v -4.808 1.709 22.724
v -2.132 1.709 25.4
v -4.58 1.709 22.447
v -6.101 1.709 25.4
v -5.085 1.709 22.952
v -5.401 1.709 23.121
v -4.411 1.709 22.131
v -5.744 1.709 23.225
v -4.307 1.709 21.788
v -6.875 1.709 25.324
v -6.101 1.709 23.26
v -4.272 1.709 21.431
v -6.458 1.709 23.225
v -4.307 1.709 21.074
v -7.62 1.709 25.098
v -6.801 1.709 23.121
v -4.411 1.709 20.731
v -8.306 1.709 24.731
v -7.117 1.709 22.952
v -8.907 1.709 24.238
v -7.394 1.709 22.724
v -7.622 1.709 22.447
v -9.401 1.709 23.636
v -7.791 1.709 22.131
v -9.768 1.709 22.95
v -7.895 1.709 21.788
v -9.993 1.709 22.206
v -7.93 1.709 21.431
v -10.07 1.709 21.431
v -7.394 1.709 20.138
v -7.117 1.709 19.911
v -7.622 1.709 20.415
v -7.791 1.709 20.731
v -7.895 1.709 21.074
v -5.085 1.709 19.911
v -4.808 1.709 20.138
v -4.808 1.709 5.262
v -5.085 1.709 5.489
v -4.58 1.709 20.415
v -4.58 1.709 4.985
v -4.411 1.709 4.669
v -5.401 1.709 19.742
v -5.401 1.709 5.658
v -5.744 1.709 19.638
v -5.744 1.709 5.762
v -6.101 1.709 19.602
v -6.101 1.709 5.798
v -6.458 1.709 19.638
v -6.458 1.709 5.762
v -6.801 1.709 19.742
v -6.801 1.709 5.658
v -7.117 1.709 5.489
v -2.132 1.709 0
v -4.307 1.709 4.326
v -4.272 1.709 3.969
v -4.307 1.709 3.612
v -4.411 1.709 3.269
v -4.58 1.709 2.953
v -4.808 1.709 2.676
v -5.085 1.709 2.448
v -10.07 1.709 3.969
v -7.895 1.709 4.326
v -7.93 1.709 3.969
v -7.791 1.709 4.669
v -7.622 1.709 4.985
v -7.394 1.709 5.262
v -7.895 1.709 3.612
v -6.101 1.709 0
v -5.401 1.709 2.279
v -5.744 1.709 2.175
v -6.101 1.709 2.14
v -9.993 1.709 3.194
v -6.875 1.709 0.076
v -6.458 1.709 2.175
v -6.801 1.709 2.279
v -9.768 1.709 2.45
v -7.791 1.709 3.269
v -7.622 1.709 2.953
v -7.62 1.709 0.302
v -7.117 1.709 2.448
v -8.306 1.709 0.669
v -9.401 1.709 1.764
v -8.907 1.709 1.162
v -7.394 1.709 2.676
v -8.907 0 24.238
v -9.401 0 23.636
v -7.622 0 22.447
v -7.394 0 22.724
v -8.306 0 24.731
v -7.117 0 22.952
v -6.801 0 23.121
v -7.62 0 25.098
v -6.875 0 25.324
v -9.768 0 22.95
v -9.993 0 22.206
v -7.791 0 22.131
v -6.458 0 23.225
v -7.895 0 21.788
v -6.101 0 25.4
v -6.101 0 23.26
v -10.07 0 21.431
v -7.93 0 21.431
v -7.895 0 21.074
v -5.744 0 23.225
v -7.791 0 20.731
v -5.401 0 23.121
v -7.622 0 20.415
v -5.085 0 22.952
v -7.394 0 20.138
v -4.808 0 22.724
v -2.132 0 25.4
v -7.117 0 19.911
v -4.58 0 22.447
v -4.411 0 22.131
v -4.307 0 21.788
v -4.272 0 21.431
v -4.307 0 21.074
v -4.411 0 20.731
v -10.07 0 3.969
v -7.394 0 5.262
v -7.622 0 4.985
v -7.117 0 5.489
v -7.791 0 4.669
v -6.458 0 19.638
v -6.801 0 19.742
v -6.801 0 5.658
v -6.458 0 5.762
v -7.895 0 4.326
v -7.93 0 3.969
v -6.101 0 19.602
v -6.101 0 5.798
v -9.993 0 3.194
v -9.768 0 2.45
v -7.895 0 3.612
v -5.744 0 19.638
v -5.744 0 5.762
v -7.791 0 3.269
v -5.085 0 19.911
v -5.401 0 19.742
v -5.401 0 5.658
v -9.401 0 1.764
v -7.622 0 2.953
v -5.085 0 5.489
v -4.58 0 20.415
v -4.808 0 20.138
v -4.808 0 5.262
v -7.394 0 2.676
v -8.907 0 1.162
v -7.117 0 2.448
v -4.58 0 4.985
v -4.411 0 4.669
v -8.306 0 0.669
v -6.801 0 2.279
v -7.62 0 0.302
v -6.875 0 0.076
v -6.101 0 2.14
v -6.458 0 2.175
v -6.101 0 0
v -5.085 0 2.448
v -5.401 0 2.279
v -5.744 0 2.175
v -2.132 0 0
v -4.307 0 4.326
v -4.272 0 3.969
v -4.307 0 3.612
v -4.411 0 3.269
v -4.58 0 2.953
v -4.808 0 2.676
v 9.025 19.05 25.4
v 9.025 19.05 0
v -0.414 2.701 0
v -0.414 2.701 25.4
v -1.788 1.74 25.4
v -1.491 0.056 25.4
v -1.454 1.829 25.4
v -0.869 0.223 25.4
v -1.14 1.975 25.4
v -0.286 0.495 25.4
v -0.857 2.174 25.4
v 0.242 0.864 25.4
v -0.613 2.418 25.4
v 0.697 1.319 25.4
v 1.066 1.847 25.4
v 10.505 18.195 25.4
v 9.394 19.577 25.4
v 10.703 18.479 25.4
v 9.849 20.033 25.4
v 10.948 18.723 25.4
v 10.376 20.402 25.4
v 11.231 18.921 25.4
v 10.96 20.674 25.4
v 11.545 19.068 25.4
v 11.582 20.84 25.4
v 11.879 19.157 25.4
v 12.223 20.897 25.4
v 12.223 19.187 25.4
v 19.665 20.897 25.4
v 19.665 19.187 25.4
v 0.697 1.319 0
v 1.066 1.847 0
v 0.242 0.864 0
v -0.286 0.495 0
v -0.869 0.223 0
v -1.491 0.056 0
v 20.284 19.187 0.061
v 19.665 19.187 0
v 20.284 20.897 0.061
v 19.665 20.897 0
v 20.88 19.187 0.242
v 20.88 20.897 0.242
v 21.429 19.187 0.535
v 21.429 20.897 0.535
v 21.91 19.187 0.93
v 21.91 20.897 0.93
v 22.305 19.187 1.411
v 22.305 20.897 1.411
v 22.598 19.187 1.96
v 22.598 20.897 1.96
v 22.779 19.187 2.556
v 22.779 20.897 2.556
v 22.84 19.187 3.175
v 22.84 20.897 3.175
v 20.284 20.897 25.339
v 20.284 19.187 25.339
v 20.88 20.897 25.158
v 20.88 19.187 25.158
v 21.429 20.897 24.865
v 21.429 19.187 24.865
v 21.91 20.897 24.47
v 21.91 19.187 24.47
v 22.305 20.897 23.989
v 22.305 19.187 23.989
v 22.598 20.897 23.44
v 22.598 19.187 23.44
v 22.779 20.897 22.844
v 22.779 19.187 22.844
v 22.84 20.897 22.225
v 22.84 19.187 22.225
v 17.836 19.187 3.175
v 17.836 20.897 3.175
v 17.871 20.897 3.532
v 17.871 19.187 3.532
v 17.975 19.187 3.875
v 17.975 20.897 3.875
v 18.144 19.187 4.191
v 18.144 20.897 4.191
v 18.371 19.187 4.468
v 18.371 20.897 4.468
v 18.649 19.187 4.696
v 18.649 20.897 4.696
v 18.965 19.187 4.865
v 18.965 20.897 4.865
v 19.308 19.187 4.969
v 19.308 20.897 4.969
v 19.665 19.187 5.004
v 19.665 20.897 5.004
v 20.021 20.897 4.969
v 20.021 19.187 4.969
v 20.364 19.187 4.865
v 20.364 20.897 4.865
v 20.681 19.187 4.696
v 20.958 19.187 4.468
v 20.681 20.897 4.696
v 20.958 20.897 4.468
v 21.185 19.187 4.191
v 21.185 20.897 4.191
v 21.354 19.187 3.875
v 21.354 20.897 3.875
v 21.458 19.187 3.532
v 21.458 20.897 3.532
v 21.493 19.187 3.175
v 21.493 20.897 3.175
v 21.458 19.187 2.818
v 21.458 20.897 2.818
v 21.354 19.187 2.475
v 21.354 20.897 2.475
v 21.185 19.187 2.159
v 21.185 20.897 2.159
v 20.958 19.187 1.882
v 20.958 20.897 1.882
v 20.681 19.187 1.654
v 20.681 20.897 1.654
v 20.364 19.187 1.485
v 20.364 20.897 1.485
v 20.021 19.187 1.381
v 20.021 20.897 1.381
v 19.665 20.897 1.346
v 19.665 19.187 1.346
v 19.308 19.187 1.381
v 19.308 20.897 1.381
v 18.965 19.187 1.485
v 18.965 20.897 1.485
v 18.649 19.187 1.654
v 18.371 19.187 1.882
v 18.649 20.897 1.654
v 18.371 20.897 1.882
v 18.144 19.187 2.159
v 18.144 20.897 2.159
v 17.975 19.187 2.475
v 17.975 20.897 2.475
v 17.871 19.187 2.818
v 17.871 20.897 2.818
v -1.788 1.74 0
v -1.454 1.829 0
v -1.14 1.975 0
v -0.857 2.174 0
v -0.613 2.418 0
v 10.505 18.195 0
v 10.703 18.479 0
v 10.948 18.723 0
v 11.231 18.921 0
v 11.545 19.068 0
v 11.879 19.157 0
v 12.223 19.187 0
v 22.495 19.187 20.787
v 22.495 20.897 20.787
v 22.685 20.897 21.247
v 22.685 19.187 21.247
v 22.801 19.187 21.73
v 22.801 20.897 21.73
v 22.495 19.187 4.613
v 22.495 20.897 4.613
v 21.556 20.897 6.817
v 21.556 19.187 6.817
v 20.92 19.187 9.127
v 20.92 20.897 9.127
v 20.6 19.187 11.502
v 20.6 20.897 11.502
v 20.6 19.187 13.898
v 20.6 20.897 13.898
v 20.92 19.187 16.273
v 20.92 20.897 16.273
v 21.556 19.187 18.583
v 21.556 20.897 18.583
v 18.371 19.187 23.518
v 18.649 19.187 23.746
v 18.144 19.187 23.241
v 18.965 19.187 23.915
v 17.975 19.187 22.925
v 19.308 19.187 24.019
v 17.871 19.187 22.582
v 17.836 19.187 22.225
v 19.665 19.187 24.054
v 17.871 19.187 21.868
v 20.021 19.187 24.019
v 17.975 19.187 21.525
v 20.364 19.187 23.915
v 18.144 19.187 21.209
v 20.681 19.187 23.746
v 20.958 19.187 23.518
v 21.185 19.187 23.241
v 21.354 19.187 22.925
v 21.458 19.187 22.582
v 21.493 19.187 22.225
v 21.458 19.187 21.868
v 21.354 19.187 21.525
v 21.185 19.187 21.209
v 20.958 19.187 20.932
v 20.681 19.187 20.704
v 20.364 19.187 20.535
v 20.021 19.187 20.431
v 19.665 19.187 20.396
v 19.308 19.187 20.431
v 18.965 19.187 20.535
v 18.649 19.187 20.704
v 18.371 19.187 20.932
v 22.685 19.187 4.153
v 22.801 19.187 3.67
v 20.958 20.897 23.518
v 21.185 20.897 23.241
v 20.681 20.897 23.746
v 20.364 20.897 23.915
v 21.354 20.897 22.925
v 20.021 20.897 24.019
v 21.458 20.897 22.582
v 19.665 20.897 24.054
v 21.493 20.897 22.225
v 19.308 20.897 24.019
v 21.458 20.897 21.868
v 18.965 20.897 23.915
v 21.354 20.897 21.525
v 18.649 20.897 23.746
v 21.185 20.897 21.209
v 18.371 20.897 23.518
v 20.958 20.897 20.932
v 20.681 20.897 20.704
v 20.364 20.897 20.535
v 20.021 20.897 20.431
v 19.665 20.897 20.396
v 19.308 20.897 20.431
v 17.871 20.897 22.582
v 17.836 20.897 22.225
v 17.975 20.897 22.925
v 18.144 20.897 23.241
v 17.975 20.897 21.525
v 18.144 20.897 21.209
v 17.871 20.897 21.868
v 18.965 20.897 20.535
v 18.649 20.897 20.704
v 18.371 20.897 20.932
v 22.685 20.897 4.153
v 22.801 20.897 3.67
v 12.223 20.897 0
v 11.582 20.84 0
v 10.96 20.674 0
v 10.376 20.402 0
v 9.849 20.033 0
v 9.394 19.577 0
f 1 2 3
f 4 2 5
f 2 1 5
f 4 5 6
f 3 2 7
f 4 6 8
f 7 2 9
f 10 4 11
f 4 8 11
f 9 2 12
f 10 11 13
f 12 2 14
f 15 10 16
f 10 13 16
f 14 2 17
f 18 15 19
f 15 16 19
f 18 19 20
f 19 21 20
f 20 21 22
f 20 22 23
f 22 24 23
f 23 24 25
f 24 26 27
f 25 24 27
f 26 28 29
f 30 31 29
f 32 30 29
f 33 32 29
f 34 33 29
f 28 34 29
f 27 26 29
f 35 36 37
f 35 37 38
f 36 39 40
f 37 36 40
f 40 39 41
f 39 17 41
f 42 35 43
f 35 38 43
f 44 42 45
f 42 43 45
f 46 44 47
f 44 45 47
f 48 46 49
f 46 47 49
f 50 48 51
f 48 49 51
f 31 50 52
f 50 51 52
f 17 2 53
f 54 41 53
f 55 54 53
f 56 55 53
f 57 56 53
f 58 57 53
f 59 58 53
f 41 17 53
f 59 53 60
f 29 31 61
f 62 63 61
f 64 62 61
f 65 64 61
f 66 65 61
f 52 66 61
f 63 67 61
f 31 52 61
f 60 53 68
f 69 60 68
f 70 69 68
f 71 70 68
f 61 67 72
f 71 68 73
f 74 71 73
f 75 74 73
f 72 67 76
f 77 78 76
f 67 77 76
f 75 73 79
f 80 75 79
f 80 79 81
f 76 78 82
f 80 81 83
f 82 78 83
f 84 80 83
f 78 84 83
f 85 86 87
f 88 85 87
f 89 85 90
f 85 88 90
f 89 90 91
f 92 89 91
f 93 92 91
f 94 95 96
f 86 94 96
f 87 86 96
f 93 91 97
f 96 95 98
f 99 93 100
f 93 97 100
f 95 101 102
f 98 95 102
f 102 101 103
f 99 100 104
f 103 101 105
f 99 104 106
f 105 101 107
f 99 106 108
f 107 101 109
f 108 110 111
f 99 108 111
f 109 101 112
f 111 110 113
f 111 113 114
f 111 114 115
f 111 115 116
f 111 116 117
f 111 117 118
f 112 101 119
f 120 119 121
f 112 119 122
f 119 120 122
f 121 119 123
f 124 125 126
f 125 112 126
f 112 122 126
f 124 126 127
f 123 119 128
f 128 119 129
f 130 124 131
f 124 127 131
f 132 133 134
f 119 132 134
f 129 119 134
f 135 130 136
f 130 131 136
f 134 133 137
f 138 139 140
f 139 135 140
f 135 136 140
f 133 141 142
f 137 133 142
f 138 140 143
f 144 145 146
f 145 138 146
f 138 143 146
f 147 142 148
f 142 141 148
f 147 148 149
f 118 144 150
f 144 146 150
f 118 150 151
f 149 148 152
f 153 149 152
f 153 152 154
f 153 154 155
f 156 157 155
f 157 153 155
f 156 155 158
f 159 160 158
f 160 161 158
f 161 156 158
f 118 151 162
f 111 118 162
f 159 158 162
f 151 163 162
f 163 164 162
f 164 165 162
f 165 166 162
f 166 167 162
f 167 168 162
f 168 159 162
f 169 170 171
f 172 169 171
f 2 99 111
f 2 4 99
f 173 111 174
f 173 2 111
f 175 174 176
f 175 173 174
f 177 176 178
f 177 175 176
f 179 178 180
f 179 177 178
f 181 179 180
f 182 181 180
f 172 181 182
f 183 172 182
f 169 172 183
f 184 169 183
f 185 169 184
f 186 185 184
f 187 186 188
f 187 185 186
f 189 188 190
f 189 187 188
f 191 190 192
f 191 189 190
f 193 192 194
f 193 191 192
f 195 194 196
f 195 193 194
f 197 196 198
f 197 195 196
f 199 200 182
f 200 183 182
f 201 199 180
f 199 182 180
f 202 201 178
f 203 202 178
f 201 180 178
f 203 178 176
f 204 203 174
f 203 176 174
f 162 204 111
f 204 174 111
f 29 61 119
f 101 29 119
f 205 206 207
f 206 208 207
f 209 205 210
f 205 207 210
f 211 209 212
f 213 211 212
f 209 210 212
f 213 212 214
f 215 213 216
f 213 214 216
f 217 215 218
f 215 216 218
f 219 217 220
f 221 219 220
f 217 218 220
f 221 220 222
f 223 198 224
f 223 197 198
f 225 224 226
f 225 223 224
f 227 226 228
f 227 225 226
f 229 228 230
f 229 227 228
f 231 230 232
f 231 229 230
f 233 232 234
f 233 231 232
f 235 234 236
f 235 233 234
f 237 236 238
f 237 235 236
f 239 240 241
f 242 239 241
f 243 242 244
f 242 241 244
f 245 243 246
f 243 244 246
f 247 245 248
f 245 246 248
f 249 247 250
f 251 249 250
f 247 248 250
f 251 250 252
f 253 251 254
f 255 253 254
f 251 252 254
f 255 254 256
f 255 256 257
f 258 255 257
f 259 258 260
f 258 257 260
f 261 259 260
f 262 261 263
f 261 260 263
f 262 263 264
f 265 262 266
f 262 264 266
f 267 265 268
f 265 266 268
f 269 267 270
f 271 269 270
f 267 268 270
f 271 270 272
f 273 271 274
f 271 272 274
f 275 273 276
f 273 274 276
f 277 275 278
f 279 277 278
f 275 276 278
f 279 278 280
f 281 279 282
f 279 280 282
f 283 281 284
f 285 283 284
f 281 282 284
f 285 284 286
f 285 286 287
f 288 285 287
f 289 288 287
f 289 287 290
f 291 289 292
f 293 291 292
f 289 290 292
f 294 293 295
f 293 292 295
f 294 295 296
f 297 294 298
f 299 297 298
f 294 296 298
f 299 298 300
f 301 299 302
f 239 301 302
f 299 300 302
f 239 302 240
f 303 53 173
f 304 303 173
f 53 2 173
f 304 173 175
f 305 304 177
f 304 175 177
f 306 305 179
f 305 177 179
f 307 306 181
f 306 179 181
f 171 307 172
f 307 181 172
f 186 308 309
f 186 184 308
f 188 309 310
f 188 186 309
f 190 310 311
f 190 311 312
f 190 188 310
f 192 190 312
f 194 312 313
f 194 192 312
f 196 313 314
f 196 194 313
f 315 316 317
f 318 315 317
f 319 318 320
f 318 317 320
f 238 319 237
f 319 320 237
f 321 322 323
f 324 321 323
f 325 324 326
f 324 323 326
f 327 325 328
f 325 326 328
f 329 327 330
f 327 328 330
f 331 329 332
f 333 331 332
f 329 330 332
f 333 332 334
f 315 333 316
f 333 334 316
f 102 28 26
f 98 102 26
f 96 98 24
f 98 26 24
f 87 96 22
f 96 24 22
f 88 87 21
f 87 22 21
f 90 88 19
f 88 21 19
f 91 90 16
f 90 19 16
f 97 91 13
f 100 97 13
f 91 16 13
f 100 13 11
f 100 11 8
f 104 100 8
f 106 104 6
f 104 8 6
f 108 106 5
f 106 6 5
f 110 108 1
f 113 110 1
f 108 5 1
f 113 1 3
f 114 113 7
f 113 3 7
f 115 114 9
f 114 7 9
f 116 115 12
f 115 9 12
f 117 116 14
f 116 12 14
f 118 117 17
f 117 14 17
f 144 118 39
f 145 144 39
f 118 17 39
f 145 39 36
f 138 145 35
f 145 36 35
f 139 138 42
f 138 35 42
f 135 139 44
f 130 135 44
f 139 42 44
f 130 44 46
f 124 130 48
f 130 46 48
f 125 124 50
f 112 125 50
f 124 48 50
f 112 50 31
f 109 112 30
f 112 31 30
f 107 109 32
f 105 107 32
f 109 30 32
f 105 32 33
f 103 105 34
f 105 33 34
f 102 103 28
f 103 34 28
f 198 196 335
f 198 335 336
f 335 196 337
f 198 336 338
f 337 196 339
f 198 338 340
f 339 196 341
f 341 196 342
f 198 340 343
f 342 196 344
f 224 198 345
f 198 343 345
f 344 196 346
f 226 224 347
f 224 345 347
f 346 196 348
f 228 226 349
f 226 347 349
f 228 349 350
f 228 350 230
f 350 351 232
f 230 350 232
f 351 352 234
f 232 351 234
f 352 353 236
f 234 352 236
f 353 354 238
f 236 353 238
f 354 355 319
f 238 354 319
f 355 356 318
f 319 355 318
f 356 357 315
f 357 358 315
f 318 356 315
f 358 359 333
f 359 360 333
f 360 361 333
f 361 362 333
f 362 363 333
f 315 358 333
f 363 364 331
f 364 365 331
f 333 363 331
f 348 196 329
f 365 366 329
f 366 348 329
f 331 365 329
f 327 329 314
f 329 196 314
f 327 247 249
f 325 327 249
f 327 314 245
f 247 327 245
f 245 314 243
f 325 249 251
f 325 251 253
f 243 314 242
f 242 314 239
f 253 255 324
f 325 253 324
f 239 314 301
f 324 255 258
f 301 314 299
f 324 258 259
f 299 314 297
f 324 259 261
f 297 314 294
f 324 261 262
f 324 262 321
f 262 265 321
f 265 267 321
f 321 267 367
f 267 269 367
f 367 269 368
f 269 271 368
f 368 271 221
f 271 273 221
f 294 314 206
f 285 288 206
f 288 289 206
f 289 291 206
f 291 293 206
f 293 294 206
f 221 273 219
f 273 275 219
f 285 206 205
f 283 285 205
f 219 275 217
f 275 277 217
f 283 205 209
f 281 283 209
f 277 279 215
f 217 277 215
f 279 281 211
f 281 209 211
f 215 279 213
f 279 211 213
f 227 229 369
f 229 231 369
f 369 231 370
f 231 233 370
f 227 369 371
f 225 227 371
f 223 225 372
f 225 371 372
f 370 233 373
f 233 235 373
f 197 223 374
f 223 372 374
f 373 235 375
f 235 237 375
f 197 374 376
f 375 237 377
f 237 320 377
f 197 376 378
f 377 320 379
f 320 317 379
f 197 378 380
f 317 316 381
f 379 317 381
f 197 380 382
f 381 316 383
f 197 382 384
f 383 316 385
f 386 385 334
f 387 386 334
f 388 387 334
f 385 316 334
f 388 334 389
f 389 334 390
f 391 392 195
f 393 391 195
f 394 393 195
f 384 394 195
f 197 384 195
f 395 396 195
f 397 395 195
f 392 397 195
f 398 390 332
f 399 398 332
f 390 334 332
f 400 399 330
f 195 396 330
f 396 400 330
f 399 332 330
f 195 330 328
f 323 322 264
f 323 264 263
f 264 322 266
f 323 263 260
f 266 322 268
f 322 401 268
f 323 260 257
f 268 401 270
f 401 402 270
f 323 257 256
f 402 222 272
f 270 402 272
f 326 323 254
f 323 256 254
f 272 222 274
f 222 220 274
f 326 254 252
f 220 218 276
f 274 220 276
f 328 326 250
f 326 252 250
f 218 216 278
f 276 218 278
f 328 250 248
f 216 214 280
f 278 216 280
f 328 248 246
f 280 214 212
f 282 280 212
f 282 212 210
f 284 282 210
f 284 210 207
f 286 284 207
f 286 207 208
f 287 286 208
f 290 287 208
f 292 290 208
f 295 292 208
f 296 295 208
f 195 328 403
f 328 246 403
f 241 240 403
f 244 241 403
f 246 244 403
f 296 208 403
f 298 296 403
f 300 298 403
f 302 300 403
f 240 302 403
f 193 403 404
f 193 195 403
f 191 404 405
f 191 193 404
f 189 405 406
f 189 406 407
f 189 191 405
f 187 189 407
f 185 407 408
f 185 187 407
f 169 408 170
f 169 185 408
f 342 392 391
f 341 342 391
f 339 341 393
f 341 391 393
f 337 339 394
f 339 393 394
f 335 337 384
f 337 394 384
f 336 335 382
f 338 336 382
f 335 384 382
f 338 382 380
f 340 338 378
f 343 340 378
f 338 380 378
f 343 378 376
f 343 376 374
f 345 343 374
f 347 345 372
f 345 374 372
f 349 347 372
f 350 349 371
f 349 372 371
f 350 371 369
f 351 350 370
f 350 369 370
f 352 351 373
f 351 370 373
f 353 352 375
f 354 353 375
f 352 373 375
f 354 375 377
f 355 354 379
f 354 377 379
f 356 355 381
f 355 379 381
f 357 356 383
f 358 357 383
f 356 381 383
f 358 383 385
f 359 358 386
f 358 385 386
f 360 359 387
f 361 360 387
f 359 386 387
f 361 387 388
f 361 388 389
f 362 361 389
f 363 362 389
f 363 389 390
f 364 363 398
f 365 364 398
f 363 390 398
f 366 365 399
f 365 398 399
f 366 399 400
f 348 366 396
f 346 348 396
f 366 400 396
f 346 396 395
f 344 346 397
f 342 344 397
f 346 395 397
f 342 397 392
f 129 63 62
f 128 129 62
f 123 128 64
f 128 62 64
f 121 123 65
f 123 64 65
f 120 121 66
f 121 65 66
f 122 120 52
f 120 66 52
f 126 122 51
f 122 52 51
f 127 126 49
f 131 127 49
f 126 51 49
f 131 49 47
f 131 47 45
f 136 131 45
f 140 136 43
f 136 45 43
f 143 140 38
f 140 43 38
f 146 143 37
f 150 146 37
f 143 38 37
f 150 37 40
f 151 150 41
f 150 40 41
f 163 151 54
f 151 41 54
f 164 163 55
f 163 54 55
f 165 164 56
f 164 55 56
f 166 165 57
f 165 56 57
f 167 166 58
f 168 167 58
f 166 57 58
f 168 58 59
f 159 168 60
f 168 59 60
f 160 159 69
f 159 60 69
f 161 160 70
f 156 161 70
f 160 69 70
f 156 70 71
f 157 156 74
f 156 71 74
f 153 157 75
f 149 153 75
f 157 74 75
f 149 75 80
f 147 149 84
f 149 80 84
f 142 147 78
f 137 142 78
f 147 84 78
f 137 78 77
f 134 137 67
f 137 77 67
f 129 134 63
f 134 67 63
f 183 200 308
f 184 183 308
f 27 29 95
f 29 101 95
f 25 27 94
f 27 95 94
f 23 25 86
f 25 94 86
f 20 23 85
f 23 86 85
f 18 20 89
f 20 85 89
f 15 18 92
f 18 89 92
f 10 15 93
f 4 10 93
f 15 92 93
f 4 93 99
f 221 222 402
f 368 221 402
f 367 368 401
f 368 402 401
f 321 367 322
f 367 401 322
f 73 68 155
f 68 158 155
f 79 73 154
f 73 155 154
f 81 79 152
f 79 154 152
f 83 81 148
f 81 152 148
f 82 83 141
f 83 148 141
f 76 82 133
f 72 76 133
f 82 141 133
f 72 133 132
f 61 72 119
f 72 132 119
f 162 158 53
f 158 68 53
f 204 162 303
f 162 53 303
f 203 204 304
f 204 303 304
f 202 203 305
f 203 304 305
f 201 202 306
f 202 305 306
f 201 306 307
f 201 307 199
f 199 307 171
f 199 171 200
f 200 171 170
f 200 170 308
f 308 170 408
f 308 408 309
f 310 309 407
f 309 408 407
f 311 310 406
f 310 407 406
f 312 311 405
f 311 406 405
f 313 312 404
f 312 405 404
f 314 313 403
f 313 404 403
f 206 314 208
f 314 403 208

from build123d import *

# Parameters (mm, degrees)
F1_DEPTH = 25.4
F2_R     = 1.8288
F3_DEPTH = 1.70942
F4_R     = 1.98374
F5_R     = 3.69316
F6_R     = 3.17499
F7_R     = 3.96875
F8_R     = 1.8288
F9_DEPTH = 1.70942


# Not quite as in the source:
# - a fillet or chamfer is up to 0.001 mm smaller than in the source, because OpenCascade refuses the exact size


with BuildPart() as f1:
    # F0 (on Top) → F1 (new body)
    with BuildSketch(Plane.XY):
        Polygon((-10.0697469202, 0), (0, 0), (11.077711991, 19.18716), (22.839589814, 19.18716), (22.839589814, 20.89658), (10.0907778938, 20.89658), (-0.9869340972, 1.70942), (-10.0697469202, 1.70942), align=None)
    extrude(amount=F1_DEPTH)

    # F2 (on face) → F3 (cut, through all)
    with BuildSketch(Plane(origin=(0, 20.89658, 0), x_dir=(-1, 0, 0), z_dir=(0, 1, 0))):
        with BuildLine():
            ThreePointArc((-22.839589814, 3.175), (-22.752350863, 3.914159458), (-22.4954281104, 4.6126993912))
            ThreePointArc((-22.4954281104, 4.6126993912), (-20.5594607088, 12.7), (-22.4954281104, 20.7873006088))
            ThreePointArc((-22.4954281104, 20.7873006088), (-22.752350863, 21.485840542), (-22.839589814, 22.225))
            Line((-22.839589814, 22.225), (-22.839589814, 3.175))
        make_face()
        with Locations((-19.664589814, 3.175)):
            Circle(F2_R)
        with Locations((-19.664589814, 22.225)):
            Circle(F2_R)
    extrude(amount=-F3_DEPTH, mode=Mode.SUBTRACT)

    # F4
    f4_edges = [f1.edges().sort_by_distance(p)[0] for p in [
        (-0.986934, 1.70942, 12.7),
        (11.077712, 19.18716, 12.7),
    ]]
    fillet(f4_edges, radius=F4_R)

    # F5
    f5_edges = [f1.edges().sort_by_distance(p)[0] for p in [
        (10.090778, 20.89658, 12.7),
        (0, 0, 12.7),
    ]]
    fillet(f5_edges, radius=F5_R)

    # F6 (radius 3.175 in the source; OpenCascade refuses exactly that, so slightly less here)
    f6_edges = [f1.edges().sort_by_distance(p)[0] for p in [
        (22.83959, 20.04187, 25.4),
        (22.83959, 20.04187, 0),
    ]]
    fillet(f6_edges, radius=F6_R)

    # F7
    f7_edges = [f1.edges().sort_by_distance(p)[0] for p in [
        (-10.069747, 0.85471, 25.4),
        (-10.069747, 0.85471, 0),
    ]]
    fillet(f7_edges, radius=F7_R)

    # F8 (on face) → F9 (cut, through all)
    with BuildSketch(Plane(origin=(0, 1.70942, 0), x_dir=(-1, 0, 0), z_dir=(0, 1, 0))):
        with Locations((6.1009969202, 3.96875)):
            Circle(F8_R)
        with Locations((6.1009969202, 21.43125)):
            Circle(F8_R)
    extrude(amount=-F9_DEPTH, mode=Mode.SUBTRACT)


solid = f1.part
